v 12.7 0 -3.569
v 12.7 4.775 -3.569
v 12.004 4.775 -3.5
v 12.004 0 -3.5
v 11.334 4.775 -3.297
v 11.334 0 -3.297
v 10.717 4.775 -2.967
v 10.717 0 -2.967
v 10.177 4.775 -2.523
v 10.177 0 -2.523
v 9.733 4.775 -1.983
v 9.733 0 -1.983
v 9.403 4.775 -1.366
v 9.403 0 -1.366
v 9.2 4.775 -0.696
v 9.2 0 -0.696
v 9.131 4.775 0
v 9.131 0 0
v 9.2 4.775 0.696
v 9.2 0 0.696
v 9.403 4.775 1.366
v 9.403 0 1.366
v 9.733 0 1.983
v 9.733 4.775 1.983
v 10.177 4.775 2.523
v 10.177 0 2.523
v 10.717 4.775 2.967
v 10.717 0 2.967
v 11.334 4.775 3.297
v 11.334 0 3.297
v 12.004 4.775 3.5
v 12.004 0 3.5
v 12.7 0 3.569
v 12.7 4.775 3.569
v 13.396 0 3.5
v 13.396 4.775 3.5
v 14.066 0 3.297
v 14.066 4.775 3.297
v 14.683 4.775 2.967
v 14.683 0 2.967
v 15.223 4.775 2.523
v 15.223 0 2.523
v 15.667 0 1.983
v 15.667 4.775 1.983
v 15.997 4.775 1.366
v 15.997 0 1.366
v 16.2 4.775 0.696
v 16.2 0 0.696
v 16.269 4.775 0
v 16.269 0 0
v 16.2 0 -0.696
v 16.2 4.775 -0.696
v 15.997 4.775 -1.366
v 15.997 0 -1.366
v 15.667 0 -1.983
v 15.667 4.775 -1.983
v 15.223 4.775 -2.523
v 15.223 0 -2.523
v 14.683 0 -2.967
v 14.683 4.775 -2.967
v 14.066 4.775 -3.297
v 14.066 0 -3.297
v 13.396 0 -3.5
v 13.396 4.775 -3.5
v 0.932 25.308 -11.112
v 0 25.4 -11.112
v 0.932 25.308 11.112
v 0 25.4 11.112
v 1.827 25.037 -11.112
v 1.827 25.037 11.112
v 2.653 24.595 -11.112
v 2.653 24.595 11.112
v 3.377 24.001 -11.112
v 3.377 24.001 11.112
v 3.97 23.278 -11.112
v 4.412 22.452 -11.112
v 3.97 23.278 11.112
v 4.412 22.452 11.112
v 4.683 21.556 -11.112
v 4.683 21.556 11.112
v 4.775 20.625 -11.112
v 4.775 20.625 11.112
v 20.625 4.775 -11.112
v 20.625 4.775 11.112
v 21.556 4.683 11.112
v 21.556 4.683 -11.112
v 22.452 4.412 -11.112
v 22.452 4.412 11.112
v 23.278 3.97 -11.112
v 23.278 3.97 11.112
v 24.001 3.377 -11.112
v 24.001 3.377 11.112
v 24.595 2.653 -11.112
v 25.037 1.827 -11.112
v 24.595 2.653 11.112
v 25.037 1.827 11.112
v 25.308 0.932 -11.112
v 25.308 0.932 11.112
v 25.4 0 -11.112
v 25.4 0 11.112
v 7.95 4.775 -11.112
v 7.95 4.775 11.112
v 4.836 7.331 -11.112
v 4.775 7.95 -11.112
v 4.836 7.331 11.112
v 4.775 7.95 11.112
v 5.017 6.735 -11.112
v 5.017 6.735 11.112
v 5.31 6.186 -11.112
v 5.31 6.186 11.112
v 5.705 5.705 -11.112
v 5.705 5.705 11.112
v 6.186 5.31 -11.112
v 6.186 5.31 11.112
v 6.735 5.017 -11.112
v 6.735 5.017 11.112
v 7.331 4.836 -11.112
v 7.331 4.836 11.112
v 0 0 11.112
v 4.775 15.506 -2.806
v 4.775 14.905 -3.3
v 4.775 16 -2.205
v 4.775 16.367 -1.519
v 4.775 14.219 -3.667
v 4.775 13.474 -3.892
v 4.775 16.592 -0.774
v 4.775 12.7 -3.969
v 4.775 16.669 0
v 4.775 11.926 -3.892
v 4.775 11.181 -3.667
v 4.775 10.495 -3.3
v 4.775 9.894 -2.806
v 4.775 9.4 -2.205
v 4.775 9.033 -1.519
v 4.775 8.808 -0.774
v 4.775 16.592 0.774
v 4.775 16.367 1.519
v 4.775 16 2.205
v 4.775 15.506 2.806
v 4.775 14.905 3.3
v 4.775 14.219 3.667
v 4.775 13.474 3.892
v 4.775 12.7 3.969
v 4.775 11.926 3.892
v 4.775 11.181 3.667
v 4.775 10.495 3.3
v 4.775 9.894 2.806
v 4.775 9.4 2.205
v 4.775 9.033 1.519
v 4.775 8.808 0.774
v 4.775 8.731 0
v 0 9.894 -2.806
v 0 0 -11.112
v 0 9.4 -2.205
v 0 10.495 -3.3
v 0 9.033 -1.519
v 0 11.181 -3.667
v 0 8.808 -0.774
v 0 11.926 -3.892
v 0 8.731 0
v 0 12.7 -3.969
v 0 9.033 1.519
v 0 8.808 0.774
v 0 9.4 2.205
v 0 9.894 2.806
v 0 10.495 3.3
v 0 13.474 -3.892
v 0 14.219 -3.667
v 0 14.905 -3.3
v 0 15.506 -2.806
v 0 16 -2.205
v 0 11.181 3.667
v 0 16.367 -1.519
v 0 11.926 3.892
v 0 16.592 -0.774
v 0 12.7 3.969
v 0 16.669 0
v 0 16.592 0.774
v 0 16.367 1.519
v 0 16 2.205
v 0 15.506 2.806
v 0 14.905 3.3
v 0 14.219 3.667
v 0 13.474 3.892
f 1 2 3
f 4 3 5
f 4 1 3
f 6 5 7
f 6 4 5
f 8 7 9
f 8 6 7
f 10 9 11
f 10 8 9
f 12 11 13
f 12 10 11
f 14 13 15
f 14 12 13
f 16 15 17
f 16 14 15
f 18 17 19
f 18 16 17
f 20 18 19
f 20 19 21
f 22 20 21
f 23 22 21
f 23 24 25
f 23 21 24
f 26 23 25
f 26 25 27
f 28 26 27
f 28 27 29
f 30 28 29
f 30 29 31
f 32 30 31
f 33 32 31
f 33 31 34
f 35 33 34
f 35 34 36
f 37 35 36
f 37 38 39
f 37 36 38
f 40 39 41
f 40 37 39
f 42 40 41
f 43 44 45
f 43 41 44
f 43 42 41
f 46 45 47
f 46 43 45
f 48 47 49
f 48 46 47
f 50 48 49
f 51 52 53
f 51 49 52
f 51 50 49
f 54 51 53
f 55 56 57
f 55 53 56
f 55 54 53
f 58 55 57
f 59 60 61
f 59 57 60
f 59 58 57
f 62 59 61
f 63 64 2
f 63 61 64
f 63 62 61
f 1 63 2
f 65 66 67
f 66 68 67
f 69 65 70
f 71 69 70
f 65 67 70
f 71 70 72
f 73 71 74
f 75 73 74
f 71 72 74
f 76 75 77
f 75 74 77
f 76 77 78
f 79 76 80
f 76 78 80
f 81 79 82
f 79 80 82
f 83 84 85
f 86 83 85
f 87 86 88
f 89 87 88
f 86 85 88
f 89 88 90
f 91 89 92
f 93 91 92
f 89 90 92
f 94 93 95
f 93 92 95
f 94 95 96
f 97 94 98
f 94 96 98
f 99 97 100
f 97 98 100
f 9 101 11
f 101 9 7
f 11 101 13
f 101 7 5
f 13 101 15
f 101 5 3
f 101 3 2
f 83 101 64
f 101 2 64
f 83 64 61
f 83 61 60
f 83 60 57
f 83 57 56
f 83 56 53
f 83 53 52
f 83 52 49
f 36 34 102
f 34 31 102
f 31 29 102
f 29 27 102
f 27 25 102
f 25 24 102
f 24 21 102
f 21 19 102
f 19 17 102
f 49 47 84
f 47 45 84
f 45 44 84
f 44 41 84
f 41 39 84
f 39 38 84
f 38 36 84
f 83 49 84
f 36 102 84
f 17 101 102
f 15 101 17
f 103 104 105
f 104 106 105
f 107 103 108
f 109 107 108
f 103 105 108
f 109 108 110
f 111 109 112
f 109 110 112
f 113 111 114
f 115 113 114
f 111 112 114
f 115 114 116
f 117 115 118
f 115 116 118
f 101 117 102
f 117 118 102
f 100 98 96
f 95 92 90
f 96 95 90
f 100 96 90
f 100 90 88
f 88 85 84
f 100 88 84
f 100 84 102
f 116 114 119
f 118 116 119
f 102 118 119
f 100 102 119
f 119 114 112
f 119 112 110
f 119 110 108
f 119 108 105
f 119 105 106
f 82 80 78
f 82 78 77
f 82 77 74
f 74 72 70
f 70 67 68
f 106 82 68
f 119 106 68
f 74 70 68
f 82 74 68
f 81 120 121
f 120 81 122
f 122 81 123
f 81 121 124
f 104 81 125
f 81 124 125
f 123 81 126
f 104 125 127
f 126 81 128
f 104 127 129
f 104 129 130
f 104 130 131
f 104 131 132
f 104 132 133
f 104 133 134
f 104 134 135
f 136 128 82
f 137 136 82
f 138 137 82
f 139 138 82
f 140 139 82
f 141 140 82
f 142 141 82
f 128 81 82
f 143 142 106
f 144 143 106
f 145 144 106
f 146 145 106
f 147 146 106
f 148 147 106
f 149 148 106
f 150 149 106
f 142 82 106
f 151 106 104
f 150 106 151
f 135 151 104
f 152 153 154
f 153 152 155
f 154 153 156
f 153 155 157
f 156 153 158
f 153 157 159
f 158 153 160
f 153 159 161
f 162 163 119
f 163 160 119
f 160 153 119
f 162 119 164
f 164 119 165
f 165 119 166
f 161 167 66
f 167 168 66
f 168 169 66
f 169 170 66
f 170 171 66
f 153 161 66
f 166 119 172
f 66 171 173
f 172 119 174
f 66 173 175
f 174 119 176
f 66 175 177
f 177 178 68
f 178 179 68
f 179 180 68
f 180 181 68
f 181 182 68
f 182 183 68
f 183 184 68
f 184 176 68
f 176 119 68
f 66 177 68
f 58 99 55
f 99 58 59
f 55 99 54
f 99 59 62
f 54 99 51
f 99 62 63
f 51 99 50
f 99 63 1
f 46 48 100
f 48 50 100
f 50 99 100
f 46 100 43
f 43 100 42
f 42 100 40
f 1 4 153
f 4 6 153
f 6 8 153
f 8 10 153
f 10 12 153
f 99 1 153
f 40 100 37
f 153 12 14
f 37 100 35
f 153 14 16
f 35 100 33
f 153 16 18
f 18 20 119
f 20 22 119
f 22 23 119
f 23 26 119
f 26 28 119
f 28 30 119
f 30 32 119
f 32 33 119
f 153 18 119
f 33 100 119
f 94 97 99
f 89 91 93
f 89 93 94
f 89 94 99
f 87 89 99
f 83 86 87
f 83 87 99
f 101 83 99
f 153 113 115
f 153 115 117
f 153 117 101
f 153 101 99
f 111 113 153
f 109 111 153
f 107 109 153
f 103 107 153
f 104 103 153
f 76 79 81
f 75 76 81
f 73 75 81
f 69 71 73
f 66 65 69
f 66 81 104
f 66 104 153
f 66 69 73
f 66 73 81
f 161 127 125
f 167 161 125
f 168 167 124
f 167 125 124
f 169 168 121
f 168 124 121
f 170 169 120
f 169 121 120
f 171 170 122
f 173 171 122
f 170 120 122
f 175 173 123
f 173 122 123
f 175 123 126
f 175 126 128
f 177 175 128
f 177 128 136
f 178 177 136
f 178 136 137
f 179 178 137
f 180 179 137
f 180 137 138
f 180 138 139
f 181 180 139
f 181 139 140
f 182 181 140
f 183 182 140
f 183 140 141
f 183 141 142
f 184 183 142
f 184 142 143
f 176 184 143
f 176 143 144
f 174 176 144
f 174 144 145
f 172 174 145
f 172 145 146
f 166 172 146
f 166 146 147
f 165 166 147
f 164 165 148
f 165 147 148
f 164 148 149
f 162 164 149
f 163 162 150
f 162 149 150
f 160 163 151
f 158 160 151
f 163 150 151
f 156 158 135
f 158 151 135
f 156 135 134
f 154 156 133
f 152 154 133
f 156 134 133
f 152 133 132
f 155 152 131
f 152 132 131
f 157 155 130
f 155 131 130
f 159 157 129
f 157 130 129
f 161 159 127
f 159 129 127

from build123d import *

# Parameters (mm, degrees)
BOSS_EXTRUDE1_DEPTH         = 11.1125
SKETCH2_R                   = 3.5687
CUT_EXTRUDE1_DEPTH          = 38.600633721
SKETCH3_R                   = 3.5687
CUT_EXTRUDE2_DEPTH          = 38.600633721
F_3_8_16_TAPPED_HOLE1_D     = 7.9375
F_3_8_16_TAPPED_HOLE1_DEPTH = 23.8125
F_3_8_16_TAPPED_HOLE1_TIP   = 2.384665582


with BuildPart() as part:
    # Sketch1 → Boss-Extrude1 (new, symmetric)
    with BuildSketch(Plane.XY):
        with BuildLine():
            Line((0, 0), (0, 25.4))
            ThreePointArc((0, 25.4), (3.376576302, 24.001376302), (4.7752, 20.6248))
            Line((4.7752, 20.6248), (4.7752, 7.9502))
            ThreePointArc((4.7752, 7.9502), (5.70513597, 5.70513597), (7.9502, 4.7752))
            Line((7.9502, 4.7752), (20.6248, 4.7752))
            ThreePointArc((20.6248, 4.7752), (24.001376302, 3.376576302), (25.4, 0))
            Line((25.4, 0), (0, 0))
        make_face()
    extrude(amount=BOSS_EXTRUDE1_DEPTH, both=True)

    # Sketch2 → Cut-Extrude1 (cut, through all)
    with BuildSketch(Plane(origin=(0, 0, 0), x_dir=(1, 0, 0), z_dir=(0, 1, 0))):
        with Locations(Location((12.7, 0, 0), (0, 0, 90))):
            Circle(SKETCH2_R)
    extrude(amount=CUT_EXTRUDE1_DEPTH, mode=Mode.SUBTRACT)

    # Sketch3 → Cut-Extrude2 (cut, through all)
    with BuildSketch(Plane(origin=(0, 0, 0), x_dir=(0, 0, -1), z_dir=(1, 0, 0))):
        with Locations(Location((0, 12.7, 0), (0, 0, 270))):
            Circle(SKETCH3_R)
    extrude(amount=CUT_EXTRUDE2_DEPTH, mode=Mode.SUBTRACT)

    # 3/8-16 Tapped Hole1
    with Locations(Plane.ZY):
        with Locations((0, 12.7)):
            Hole(F_3_8_16_TAPPED_HOLE1_D / 2, depth=F_3_8_16_TAPPED_HOLE1_DEPTH)
            with Locations((0, 0, -(F_3_8_16_TAPPED_HOLE1_DEPTH + F_3_8_16_TAPPED_HOLE1_TIP / 2))):  # 118° drill point
                Cone(0, F_3_8_16_TAPPED_HOLE1_D / 2, F_3_8_16_TAPPED_HOLE1_TIP, mode=Mode.SUBTRACT)


solid = part.part
